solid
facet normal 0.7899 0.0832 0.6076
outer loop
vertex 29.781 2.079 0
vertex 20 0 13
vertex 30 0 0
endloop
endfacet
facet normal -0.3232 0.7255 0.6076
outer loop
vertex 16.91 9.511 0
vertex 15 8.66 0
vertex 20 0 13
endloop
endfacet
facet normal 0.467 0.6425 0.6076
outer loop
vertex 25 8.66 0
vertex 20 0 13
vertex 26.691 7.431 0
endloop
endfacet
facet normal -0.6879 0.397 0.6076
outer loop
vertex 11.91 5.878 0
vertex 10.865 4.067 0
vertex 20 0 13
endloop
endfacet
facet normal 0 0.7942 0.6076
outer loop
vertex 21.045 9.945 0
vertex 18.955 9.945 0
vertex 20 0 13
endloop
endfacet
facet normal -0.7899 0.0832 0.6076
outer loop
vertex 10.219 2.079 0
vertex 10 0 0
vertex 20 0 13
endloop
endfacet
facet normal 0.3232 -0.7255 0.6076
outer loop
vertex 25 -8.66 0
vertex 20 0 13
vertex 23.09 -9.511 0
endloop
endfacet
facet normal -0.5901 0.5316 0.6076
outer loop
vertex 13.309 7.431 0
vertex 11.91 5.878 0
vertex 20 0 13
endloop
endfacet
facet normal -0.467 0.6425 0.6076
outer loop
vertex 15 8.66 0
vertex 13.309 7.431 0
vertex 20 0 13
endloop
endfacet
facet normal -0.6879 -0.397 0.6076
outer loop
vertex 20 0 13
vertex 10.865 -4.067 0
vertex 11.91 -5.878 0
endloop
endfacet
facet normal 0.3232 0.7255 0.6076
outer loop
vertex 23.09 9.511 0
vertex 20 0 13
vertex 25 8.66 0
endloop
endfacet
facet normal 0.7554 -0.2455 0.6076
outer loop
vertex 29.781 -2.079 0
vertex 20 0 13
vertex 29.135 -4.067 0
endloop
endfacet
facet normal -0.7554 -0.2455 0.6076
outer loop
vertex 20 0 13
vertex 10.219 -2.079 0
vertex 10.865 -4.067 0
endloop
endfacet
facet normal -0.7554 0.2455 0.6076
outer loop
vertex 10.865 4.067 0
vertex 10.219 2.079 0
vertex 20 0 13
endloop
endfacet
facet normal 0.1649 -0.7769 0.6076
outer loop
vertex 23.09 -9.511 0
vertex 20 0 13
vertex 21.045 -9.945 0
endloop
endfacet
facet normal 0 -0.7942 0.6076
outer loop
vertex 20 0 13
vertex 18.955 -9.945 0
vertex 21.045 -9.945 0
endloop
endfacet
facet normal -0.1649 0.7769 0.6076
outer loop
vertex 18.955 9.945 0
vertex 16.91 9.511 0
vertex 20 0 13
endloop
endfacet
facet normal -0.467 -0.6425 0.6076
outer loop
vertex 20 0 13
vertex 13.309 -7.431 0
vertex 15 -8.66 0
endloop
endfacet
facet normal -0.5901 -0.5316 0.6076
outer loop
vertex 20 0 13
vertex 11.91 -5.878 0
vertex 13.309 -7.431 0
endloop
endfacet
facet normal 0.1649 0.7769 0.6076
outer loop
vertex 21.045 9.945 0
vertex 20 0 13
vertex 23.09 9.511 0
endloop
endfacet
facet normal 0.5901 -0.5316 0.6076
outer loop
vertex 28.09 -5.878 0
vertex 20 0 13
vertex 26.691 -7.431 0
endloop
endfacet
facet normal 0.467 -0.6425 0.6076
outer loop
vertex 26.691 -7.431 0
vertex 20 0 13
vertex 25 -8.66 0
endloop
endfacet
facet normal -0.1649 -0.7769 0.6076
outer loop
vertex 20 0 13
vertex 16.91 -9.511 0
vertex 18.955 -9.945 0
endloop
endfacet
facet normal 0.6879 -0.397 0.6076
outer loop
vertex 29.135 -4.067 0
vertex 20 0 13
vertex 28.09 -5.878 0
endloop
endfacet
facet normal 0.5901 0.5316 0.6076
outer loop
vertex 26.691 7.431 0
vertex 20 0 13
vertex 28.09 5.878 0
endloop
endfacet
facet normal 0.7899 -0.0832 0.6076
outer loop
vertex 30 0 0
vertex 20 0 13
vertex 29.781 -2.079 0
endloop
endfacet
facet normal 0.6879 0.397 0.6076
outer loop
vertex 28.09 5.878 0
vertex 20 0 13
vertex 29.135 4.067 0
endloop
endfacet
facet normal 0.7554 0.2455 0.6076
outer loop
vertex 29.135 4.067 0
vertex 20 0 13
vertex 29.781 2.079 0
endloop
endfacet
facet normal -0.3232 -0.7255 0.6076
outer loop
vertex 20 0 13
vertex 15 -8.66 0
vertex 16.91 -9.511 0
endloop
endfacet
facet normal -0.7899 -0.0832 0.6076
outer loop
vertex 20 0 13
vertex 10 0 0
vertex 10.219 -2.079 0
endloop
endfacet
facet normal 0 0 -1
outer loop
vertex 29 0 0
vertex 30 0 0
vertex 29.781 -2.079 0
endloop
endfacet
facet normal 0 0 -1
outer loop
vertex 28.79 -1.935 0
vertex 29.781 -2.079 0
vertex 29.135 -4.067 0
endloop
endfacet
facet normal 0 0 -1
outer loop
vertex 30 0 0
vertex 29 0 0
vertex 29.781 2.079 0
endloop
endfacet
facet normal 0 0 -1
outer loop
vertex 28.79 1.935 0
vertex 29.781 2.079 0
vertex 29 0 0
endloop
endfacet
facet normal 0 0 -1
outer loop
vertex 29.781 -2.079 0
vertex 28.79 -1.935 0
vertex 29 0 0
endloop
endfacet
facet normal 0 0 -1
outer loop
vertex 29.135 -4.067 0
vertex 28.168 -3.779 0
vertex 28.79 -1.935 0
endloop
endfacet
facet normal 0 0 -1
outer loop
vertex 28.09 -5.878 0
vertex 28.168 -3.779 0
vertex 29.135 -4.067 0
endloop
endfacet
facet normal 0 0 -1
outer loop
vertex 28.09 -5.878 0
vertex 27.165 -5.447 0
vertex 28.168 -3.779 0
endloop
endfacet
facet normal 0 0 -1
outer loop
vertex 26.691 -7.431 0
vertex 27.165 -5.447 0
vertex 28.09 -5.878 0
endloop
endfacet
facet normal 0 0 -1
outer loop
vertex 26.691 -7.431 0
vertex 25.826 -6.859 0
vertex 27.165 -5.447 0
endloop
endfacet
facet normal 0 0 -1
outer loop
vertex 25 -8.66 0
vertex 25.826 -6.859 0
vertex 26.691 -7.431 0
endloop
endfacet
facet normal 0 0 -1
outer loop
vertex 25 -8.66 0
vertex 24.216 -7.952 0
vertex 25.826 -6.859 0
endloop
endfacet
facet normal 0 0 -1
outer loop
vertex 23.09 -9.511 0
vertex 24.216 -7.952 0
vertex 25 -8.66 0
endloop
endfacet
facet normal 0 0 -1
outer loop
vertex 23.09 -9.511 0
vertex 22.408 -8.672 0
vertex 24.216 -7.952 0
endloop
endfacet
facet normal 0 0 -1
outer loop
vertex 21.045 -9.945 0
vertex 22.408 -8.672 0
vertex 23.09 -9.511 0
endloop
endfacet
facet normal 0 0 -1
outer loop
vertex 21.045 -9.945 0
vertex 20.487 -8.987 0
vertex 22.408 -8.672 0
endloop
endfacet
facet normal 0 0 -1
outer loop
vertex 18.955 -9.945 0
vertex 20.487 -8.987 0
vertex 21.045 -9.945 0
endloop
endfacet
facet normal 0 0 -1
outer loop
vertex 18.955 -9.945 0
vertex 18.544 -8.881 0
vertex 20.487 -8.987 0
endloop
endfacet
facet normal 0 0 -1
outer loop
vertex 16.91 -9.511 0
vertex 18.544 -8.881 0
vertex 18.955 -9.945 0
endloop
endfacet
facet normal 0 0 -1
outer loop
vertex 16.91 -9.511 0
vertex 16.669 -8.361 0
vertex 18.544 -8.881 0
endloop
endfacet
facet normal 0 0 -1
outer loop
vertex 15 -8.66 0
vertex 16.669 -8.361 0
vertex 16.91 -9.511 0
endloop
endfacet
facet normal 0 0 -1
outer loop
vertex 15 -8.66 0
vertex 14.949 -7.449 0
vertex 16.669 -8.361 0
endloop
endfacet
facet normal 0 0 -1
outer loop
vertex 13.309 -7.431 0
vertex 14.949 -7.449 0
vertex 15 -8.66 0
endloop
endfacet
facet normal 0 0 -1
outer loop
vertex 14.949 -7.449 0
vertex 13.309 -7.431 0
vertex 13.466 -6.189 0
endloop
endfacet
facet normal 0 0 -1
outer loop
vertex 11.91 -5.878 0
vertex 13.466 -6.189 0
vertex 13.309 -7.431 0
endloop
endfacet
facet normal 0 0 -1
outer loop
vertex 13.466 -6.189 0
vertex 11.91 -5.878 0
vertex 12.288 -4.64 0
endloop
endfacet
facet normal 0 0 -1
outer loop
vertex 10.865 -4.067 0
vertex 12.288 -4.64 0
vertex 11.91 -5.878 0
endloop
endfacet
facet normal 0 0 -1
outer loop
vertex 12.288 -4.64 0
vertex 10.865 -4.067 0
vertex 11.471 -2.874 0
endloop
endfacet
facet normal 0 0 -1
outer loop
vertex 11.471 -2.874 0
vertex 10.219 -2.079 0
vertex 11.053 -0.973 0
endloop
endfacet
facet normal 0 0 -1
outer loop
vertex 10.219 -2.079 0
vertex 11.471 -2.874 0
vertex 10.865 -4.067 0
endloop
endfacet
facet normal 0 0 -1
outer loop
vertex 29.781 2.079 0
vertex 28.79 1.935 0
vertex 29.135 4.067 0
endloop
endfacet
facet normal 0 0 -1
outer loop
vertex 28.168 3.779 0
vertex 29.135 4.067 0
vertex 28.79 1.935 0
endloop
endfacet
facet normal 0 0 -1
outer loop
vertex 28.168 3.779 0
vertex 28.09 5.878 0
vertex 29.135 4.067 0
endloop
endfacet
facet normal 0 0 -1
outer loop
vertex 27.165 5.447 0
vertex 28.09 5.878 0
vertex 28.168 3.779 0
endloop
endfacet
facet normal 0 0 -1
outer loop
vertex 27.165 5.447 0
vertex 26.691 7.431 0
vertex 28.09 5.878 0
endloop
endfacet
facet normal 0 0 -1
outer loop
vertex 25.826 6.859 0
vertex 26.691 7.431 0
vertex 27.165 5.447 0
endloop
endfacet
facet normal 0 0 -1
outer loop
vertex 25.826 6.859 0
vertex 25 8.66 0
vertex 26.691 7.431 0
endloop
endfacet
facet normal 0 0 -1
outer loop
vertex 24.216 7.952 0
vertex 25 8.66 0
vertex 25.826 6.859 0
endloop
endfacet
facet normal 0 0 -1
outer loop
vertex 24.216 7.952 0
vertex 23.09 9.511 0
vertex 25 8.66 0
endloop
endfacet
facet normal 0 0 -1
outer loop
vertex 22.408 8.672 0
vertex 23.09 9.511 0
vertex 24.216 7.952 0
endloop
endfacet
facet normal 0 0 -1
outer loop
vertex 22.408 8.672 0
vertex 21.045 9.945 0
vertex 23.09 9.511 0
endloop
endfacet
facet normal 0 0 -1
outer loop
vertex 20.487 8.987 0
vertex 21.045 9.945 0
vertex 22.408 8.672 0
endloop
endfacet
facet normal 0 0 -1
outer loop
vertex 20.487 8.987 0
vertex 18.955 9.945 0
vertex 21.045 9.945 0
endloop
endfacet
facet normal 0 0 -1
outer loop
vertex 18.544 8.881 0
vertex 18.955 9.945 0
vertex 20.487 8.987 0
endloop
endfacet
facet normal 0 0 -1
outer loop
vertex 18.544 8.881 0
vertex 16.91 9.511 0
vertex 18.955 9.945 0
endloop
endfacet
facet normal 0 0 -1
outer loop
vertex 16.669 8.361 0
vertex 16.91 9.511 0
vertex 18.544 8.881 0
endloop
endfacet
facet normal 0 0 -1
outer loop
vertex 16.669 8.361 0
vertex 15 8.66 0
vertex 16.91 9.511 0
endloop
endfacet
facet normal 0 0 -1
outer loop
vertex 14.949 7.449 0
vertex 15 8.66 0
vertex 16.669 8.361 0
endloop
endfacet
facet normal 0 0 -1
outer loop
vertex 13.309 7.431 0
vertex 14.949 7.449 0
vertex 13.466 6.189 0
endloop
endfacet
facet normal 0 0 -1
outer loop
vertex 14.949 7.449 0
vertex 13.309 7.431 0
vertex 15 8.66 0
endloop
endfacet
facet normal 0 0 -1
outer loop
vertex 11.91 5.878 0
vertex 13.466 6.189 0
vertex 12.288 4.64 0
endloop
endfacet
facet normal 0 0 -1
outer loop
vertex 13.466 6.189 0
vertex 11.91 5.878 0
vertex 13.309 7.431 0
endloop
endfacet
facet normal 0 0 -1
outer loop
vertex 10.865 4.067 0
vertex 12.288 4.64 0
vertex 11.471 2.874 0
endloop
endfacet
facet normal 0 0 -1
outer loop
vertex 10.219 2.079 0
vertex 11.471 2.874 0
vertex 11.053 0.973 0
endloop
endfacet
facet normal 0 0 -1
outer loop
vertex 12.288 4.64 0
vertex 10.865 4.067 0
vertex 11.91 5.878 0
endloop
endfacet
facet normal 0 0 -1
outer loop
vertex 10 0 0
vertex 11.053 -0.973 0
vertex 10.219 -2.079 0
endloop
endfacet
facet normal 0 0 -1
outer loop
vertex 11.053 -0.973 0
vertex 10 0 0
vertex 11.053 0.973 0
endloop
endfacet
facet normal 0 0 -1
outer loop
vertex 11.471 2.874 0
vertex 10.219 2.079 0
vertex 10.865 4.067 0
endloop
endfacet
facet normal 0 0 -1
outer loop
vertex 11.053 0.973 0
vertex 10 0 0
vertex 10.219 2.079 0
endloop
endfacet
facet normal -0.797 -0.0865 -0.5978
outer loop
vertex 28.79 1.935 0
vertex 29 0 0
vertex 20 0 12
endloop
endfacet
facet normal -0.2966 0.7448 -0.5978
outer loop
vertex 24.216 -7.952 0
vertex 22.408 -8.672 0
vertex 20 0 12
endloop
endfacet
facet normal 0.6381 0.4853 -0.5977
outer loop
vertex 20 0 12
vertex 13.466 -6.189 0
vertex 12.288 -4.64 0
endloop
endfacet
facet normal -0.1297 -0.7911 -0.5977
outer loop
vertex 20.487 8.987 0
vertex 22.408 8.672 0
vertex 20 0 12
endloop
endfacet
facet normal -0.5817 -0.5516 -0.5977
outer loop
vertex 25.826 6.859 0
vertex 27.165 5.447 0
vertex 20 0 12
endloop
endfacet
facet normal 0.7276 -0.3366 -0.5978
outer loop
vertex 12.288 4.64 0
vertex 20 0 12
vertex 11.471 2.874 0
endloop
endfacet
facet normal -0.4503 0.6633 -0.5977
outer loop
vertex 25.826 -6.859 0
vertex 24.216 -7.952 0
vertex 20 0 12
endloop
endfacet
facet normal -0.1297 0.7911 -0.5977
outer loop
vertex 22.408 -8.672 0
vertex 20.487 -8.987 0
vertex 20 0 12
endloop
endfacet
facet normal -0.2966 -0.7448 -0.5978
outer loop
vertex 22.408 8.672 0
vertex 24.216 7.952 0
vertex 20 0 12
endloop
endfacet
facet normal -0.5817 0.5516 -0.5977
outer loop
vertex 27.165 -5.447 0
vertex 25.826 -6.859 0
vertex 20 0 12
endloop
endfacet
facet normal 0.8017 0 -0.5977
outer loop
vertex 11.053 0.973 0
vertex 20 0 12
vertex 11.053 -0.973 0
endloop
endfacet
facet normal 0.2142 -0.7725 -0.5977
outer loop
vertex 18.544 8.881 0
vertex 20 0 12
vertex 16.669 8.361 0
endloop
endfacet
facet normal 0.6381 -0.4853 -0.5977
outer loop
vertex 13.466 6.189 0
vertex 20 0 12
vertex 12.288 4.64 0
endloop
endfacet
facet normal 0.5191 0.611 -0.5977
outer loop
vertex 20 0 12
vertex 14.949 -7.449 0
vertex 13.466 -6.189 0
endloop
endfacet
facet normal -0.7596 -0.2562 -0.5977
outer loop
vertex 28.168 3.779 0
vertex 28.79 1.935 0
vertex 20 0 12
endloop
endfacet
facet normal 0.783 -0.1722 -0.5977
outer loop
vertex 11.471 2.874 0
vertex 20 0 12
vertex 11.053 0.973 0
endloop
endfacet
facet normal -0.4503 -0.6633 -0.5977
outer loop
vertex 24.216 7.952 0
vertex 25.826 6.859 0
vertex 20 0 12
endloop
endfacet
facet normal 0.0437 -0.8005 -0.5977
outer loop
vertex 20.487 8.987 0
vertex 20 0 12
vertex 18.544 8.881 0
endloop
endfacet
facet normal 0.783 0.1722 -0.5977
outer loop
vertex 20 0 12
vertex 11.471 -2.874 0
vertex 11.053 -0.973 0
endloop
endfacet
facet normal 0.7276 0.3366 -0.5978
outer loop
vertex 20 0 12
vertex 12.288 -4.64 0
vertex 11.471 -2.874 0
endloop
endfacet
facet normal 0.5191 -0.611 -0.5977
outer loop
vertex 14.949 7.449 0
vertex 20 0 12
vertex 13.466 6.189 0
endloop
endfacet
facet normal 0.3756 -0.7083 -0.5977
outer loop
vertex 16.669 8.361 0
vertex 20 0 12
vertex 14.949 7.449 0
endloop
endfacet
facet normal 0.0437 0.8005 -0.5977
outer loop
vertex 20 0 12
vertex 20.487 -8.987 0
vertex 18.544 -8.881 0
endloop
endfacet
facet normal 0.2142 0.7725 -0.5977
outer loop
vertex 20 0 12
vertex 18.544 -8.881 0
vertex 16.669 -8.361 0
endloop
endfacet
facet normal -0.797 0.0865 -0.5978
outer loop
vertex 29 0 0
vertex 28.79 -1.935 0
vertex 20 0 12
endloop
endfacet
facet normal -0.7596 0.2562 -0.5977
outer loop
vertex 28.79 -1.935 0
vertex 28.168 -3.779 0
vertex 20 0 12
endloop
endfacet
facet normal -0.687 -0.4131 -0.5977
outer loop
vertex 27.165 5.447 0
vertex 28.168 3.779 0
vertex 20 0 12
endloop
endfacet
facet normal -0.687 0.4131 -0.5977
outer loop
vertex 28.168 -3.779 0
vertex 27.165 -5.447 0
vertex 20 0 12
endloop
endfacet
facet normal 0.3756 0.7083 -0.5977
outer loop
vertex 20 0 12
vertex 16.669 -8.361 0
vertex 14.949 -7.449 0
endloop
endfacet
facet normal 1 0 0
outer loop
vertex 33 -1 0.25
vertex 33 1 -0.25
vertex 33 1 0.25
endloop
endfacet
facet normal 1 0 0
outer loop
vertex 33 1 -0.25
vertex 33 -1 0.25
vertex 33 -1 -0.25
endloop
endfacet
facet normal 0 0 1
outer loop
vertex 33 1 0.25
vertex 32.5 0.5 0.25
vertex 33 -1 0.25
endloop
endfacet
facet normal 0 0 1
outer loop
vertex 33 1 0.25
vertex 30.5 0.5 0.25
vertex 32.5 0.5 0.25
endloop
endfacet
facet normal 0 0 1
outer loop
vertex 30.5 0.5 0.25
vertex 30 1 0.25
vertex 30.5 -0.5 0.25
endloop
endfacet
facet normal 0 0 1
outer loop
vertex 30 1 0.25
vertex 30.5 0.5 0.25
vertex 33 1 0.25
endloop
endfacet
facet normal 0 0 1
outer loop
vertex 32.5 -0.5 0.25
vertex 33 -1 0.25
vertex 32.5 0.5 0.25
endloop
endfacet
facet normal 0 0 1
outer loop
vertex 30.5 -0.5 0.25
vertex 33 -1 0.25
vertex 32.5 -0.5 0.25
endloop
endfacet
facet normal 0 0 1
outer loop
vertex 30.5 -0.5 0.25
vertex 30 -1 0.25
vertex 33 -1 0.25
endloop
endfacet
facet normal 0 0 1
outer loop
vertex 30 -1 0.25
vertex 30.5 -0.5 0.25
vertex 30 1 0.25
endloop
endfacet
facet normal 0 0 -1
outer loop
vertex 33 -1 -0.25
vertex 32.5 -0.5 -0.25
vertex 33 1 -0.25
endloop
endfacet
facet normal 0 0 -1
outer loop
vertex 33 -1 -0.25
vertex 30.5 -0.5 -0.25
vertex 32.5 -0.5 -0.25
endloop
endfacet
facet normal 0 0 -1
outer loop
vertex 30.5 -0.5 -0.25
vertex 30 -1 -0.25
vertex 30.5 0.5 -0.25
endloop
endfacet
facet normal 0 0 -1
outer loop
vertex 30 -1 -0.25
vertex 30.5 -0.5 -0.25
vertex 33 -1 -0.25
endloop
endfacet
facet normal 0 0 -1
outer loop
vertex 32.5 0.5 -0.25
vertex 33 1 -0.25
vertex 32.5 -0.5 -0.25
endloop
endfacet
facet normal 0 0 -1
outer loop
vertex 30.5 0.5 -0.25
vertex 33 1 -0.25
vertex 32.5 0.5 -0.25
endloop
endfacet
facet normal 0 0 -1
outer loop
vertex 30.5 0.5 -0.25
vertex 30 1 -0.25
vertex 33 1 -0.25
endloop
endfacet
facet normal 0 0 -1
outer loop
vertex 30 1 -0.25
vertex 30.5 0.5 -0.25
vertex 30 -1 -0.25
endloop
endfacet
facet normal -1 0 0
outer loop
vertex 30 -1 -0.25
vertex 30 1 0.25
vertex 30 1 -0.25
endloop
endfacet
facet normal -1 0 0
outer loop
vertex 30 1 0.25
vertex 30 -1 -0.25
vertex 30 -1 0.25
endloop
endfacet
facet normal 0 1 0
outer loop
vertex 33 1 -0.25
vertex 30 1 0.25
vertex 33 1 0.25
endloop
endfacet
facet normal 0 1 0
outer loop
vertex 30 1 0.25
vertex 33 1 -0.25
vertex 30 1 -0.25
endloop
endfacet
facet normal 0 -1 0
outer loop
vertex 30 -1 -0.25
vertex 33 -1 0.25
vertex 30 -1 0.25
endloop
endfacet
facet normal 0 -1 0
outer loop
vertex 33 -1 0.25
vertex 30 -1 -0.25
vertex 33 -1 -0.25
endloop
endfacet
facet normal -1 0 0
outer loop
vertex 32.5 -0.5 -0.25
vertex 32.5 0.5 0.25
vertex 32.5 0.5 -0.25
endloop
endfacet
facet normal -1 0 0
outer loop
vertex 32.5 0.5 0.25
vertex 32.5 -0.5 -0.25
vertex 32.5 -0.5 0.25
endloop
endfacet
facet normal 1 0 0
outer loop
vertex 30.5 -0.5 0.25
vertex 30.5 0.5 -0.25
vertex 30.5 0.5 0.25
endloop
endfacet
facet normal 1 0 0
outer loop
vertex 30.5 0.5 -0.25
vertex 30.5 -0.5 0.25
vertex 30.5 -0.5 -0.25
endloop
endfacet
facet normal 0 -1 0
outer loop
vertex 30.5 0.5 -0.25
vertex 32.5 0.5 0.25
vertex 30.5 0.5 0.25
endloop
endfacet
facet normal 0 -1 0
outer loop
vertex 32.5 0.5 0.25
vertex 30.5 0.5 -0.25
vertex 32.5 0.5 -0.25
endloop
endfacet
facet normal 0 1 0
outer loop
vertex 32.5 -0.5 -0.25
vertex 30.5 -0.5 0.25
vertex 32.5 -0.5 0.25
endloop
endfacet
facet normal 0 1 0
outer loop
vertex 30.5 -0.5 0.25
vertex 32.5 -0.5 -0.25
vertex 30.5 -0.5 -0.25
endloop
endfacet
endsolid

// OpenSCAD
translate ([20,0,0]) {
    
difference () {
cylinder (r1=10 , r2=0 , h=13);
cylinder (r1=9 , r2=0 , h=12);
}

difference (){
        translate ([10,-1,-0.25])
        cube ([3,2,0.5]);
        translate ([10.5,-.5,-0.25])
        cube ([2,1,1]);
    }
}

circle(2, $fn=3);
